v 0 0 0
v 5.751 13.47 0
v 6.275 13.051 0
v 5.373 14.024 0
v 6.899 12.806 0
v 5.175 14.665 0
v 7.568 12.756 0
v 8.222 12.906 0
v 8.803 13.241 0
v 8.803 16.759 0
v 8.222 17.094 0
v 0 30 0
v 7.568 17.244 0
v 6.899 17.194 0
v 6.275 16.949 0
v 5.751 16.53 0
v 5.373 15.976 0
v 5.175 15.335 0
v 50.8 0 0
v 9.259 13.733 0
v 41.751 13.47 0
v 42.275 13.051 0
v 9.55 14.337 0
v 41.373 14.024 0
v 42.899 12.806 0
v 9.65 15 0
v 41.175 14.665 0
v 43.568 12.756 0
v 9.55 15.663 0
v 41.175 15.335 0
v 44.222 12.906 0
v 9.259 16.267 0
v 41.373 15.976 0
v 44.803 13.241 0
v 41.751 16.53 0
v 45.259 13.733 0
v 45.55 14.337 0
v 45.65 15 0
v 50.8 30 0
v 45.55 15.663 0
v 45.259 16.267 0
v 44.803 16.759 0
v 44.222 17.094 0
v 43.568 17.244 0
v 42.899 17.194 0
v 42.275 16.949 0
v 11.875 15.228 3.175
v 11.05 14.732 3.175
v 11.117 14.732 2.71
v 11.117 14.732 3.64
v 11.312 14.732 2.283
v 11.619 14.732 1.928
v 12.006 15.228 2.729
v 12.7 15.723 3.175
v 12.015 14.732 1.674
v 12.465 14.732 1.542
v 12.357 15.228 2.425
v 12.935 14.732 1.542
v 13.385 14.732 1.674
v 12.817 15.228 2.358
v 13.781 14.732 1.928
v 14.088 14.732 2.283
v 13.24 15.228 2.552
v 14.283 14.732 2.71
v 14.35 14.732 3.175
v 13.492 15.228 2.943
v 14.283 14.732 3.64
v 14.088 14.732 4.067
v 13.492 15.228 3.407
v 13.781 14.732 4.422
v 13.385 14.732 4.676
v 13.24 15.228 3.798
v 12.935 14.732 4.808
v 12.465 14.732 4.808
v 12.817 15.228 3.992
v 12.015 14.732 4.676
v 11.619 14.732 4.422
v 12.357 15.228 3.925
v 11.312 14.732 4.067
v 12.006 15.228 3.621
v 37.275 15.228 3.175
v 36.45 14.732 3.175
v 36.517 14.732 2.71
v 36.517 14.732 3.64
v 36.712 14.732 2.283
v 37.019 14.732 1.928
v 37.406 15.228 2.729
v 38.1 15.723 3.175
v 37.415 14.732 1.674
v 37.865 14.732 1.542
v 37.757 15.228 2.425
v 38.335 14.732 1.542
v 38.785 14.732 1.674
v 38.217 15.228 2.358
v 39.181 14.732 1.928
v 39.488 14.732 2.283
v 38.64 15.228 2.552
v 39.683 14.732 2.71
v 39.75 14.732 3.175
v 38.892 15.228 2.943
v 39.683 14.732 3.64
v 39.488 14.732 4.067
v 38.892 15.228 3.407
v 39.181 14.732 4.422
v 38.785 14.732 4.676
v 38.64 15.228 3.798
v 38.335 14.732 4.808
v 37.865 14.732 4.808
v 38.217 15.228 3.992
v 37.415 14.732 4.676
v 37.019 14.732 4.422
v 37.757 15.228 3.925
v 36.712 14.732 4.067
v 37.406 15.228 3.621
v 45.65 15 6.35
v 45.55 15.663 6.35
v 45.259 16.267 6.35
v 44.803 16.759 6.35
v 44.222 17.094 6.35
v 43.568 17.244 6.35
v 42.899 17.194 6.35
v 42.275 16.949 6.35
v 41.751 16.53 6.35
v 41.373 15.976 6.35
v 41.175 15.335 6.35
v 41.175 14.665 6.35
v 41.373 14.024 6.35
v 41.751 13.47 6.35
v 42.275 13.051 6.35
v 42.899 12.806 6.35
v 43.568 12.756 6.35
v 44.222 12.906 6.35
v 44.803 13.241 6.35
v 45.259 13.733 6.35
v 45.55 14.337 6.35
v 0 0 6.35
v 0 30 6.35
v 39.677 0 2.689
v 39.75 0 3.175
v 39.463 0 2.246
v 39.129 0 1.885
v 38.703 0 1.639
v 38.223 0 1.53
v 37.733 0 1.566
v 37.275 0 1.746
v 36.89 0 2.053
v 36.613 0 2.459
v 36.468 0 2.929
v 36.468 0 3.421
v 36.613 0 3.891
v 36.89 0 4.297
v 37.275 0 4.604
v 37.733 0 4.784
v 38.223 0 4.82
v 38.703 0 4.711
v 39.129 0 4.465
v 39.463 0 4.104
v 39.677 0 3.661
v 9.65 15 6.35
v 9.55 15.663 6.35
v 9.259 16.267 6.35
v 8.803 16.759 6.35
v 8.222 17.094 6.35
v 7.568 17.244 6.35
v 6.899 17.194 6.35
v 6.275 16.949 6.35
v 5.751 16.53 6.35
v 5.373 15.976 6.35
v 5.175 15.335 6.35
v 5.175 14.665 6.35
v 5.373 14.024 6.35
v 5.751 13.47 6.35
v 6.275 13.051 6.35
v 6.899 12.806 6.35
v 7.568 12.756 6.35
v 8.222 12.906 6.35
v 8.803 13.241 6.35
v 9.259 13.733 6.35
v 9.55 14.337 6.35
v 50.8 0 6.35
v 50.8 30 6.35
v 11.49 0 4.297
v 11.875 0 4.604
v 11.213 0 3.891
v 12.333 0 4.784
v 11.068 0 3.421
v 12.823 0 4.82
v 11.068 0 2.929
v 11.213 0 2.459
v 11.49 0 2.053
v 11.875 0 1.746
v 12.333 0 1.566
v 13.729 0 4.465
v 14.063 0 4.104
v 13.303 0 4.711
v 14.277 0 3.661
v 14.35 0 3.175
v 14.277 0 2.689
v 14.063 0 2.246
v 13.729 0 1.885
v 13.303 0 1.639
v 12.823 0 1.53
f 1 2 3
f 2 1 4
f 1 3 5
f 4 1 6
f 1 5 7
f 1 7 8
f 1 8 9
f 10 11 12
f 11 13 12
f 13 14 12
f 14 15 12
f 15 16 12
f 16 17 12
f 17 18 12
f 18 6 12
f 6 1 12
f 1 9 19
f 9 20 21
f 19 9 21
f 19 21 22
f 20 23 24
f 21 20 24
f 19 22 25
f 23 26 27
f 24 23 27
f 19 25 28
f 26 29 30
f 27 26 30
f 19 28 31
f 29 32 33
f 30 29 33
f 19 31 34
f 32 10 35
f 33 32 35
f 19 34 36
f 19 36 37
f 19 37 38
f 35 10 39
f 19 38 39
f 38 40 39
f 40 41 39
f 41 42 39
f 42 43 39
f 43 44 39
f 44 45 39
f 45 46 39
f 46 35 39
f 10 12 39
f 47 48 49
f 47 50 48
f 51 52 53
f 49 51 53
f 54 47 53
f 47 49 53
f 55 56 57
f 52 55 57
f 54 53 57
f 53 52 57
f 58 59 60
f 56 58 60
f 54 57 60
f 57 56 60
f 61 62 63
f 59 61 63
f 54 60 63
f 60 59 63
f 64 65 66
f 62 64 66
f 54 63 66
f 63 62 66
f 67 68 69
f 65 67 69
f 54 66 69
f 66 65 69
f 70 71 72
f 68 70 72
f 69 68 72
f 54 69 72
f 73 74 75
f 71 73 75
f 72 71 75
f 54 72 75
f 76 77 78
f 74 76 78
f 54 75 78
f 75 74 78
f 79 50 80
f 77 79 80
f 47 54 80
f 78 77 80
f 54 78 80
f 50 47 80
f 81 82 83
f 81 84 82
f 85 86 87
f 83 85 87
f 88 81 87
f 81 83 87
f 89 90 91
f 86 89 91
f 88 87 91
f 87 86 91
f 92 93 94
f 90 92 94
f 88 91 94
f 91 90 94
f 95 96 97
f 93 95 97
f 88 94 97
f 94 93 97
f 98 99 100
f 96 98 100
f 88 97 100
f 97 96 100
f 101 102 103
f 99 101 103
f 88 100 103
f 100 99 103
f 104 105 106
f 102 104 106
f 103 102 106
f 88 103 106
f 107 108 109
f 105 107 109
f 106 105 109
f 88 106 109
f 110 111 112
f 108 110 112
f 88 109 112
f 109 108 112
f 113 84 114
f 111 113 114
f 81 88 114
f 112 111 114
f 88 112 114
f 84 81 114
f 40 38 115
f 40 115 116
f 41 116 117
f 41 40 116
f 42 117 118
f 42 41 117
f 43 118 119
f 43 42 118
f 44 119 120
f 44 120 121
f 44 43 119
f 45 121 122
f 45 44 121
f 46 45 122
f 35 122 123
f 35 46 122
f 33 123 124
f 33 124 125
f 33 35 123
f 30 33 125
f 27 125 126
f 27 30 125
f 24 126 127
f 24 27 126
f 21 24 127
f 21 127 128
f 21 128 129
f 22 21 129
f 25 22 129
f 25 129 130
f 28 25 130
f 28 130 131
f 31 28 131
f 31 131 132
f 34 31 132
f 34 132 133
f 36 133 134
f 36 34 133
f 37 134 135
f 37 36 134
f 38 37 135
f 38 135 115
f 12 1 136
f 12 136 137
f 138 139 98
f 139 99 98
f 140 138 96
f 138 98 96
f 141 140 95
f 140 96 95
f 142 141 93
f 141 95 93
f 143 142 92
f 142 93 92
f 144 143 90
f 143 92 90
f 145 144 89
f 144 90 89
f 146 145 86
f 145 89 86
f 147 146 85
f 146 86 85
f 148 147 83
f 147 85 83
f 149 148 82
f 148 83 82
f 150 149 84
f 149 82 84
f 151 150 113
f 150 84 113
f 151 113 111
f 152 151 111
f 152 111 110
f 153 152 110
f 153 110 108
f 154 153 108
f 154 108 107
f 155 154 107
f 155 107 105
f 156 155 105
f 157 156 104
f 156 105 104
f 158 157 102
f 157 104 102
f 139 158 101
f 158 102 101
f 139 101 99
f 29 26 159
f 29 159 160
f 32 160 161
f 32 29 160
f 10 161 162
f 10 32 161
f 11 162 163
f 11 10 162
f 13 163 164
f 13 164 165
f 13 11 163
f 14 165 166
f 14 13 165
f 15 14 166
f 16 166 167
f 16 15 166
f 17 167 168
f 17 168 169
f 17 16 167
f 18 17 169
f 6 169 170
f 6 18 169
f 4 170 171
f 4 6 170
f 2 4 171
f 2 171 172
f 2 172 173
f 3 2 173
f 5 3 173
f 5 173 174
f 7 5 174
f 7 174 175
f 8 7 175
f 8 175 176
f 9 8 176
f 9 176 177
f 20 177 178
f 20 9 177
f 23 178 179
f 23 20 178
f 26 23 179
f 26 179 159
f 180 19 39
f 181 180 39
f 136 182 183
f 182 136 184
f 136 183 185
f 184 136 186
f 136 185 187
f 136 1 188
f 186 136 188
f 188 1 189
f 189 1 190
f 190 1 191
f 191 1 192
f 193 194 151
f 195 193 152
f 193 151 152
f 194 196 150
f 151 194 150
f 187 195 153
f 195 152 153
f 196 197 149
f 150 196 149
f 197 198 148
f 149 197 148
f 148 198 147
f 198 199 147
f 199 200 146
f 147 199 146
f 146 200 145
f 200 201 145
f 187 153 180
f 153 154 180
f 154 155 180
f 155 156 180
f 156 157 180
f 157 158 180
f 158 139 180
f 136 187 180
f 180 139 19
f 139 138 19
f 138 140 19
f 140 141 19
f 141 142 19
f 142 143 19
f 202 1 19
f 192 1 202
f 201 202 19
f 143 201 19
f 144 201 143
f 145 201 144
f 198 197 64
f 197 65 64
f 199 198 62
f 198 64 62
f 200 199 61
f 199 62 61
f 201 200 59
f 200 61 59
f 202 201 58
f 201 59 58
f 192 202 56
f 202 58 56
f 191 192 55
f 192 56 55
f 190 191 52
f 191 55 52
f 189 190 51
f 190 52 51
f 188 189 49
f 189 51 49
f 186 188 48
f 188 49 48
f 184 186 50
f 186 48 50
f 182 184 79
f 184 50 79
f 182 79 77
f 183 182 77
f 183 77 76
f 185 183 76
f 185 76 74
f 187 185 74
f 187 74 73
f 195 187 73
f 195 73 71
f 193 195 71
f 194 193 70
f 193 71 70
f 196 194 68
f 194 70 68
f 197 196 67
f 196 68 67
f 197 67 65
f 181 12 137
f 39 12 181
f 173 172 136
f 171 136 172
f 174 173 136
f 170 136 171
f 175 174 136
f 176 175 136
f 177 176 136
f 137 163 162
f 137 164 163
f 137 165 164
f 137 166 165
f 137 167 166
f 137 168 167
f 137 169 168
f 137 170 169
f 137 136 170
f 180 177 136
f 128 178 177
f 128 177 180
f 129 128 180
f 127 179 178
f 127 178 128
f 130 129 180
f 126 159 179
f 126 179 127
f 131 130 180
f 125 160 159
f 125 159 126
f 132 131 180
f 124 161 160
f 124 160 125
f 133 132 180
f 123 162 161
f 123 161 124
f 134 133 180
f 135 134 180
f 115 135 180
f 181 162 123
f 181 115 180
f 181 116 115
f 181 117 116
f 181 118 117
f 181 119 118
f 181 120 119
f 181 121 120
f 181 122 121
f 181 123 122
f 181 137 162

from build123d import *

# Parameters (mm, degrees)
SKETCH1_W                 = 50.8
SKETCH1_H                 = 30
SKETCH1_R                 = 2.25
BOSS_EXTRUDE1_DEPTH       = 6.35
M4X0_7_TAPPED_HOLE1_D     = 3.3
M4X0_7_TAPPED_HOLE1_DEPTH = 14.732
M4X0_7_TAPPED_HOLE1_TIP   = 0.991420021


with BuildPart() as part:
    # Sketch1 → Boss-Extrude1 (new body)
    with BuildSketch(Plane.XY):
        with Locations((25.4, 15)):
            Rectangle(SKETCH1_W, SKETCH1_H)
        with Locations((7.400000059, 15)):
            Circle(SKETCH1_R, mode=Mode.SUBTRACT)
        with Locations((43.400000059, 15)):
            Circle(SKETCH1_R, mode=Mode.SUBTRACT)
    extrude(amount=BOSS_EXTRUDE1_DEPTH)

    # M4x0.7 Tapped Hole1
    with Locations(Plane(origin=(0, 0, 0), x_dir=(-1, 0, 0), z_dir=(0, -1, 0))):
        with Locations((-12.7, -3.175), (-38.1, -3.175)):
            Hole(M4X0_7_TAPPED_HOLE1_D / 2, depth=M4X0_7_TAPPED_HOLE1_DEPTH)
            with Locations((0, 0, -(M4X0_7_TAPPED_HOLE1_DEPTH + M4X0_7_TAPPED_HOLE1_TIP / 2))):  # 118° drill point
                Cone(0, M4X0_7_TAPPED_HOLE1_D / 2, M4X0_7_TAPPED_HOLE1_TIP, mode=Mode.SUBTRACT)


solid = part.part
